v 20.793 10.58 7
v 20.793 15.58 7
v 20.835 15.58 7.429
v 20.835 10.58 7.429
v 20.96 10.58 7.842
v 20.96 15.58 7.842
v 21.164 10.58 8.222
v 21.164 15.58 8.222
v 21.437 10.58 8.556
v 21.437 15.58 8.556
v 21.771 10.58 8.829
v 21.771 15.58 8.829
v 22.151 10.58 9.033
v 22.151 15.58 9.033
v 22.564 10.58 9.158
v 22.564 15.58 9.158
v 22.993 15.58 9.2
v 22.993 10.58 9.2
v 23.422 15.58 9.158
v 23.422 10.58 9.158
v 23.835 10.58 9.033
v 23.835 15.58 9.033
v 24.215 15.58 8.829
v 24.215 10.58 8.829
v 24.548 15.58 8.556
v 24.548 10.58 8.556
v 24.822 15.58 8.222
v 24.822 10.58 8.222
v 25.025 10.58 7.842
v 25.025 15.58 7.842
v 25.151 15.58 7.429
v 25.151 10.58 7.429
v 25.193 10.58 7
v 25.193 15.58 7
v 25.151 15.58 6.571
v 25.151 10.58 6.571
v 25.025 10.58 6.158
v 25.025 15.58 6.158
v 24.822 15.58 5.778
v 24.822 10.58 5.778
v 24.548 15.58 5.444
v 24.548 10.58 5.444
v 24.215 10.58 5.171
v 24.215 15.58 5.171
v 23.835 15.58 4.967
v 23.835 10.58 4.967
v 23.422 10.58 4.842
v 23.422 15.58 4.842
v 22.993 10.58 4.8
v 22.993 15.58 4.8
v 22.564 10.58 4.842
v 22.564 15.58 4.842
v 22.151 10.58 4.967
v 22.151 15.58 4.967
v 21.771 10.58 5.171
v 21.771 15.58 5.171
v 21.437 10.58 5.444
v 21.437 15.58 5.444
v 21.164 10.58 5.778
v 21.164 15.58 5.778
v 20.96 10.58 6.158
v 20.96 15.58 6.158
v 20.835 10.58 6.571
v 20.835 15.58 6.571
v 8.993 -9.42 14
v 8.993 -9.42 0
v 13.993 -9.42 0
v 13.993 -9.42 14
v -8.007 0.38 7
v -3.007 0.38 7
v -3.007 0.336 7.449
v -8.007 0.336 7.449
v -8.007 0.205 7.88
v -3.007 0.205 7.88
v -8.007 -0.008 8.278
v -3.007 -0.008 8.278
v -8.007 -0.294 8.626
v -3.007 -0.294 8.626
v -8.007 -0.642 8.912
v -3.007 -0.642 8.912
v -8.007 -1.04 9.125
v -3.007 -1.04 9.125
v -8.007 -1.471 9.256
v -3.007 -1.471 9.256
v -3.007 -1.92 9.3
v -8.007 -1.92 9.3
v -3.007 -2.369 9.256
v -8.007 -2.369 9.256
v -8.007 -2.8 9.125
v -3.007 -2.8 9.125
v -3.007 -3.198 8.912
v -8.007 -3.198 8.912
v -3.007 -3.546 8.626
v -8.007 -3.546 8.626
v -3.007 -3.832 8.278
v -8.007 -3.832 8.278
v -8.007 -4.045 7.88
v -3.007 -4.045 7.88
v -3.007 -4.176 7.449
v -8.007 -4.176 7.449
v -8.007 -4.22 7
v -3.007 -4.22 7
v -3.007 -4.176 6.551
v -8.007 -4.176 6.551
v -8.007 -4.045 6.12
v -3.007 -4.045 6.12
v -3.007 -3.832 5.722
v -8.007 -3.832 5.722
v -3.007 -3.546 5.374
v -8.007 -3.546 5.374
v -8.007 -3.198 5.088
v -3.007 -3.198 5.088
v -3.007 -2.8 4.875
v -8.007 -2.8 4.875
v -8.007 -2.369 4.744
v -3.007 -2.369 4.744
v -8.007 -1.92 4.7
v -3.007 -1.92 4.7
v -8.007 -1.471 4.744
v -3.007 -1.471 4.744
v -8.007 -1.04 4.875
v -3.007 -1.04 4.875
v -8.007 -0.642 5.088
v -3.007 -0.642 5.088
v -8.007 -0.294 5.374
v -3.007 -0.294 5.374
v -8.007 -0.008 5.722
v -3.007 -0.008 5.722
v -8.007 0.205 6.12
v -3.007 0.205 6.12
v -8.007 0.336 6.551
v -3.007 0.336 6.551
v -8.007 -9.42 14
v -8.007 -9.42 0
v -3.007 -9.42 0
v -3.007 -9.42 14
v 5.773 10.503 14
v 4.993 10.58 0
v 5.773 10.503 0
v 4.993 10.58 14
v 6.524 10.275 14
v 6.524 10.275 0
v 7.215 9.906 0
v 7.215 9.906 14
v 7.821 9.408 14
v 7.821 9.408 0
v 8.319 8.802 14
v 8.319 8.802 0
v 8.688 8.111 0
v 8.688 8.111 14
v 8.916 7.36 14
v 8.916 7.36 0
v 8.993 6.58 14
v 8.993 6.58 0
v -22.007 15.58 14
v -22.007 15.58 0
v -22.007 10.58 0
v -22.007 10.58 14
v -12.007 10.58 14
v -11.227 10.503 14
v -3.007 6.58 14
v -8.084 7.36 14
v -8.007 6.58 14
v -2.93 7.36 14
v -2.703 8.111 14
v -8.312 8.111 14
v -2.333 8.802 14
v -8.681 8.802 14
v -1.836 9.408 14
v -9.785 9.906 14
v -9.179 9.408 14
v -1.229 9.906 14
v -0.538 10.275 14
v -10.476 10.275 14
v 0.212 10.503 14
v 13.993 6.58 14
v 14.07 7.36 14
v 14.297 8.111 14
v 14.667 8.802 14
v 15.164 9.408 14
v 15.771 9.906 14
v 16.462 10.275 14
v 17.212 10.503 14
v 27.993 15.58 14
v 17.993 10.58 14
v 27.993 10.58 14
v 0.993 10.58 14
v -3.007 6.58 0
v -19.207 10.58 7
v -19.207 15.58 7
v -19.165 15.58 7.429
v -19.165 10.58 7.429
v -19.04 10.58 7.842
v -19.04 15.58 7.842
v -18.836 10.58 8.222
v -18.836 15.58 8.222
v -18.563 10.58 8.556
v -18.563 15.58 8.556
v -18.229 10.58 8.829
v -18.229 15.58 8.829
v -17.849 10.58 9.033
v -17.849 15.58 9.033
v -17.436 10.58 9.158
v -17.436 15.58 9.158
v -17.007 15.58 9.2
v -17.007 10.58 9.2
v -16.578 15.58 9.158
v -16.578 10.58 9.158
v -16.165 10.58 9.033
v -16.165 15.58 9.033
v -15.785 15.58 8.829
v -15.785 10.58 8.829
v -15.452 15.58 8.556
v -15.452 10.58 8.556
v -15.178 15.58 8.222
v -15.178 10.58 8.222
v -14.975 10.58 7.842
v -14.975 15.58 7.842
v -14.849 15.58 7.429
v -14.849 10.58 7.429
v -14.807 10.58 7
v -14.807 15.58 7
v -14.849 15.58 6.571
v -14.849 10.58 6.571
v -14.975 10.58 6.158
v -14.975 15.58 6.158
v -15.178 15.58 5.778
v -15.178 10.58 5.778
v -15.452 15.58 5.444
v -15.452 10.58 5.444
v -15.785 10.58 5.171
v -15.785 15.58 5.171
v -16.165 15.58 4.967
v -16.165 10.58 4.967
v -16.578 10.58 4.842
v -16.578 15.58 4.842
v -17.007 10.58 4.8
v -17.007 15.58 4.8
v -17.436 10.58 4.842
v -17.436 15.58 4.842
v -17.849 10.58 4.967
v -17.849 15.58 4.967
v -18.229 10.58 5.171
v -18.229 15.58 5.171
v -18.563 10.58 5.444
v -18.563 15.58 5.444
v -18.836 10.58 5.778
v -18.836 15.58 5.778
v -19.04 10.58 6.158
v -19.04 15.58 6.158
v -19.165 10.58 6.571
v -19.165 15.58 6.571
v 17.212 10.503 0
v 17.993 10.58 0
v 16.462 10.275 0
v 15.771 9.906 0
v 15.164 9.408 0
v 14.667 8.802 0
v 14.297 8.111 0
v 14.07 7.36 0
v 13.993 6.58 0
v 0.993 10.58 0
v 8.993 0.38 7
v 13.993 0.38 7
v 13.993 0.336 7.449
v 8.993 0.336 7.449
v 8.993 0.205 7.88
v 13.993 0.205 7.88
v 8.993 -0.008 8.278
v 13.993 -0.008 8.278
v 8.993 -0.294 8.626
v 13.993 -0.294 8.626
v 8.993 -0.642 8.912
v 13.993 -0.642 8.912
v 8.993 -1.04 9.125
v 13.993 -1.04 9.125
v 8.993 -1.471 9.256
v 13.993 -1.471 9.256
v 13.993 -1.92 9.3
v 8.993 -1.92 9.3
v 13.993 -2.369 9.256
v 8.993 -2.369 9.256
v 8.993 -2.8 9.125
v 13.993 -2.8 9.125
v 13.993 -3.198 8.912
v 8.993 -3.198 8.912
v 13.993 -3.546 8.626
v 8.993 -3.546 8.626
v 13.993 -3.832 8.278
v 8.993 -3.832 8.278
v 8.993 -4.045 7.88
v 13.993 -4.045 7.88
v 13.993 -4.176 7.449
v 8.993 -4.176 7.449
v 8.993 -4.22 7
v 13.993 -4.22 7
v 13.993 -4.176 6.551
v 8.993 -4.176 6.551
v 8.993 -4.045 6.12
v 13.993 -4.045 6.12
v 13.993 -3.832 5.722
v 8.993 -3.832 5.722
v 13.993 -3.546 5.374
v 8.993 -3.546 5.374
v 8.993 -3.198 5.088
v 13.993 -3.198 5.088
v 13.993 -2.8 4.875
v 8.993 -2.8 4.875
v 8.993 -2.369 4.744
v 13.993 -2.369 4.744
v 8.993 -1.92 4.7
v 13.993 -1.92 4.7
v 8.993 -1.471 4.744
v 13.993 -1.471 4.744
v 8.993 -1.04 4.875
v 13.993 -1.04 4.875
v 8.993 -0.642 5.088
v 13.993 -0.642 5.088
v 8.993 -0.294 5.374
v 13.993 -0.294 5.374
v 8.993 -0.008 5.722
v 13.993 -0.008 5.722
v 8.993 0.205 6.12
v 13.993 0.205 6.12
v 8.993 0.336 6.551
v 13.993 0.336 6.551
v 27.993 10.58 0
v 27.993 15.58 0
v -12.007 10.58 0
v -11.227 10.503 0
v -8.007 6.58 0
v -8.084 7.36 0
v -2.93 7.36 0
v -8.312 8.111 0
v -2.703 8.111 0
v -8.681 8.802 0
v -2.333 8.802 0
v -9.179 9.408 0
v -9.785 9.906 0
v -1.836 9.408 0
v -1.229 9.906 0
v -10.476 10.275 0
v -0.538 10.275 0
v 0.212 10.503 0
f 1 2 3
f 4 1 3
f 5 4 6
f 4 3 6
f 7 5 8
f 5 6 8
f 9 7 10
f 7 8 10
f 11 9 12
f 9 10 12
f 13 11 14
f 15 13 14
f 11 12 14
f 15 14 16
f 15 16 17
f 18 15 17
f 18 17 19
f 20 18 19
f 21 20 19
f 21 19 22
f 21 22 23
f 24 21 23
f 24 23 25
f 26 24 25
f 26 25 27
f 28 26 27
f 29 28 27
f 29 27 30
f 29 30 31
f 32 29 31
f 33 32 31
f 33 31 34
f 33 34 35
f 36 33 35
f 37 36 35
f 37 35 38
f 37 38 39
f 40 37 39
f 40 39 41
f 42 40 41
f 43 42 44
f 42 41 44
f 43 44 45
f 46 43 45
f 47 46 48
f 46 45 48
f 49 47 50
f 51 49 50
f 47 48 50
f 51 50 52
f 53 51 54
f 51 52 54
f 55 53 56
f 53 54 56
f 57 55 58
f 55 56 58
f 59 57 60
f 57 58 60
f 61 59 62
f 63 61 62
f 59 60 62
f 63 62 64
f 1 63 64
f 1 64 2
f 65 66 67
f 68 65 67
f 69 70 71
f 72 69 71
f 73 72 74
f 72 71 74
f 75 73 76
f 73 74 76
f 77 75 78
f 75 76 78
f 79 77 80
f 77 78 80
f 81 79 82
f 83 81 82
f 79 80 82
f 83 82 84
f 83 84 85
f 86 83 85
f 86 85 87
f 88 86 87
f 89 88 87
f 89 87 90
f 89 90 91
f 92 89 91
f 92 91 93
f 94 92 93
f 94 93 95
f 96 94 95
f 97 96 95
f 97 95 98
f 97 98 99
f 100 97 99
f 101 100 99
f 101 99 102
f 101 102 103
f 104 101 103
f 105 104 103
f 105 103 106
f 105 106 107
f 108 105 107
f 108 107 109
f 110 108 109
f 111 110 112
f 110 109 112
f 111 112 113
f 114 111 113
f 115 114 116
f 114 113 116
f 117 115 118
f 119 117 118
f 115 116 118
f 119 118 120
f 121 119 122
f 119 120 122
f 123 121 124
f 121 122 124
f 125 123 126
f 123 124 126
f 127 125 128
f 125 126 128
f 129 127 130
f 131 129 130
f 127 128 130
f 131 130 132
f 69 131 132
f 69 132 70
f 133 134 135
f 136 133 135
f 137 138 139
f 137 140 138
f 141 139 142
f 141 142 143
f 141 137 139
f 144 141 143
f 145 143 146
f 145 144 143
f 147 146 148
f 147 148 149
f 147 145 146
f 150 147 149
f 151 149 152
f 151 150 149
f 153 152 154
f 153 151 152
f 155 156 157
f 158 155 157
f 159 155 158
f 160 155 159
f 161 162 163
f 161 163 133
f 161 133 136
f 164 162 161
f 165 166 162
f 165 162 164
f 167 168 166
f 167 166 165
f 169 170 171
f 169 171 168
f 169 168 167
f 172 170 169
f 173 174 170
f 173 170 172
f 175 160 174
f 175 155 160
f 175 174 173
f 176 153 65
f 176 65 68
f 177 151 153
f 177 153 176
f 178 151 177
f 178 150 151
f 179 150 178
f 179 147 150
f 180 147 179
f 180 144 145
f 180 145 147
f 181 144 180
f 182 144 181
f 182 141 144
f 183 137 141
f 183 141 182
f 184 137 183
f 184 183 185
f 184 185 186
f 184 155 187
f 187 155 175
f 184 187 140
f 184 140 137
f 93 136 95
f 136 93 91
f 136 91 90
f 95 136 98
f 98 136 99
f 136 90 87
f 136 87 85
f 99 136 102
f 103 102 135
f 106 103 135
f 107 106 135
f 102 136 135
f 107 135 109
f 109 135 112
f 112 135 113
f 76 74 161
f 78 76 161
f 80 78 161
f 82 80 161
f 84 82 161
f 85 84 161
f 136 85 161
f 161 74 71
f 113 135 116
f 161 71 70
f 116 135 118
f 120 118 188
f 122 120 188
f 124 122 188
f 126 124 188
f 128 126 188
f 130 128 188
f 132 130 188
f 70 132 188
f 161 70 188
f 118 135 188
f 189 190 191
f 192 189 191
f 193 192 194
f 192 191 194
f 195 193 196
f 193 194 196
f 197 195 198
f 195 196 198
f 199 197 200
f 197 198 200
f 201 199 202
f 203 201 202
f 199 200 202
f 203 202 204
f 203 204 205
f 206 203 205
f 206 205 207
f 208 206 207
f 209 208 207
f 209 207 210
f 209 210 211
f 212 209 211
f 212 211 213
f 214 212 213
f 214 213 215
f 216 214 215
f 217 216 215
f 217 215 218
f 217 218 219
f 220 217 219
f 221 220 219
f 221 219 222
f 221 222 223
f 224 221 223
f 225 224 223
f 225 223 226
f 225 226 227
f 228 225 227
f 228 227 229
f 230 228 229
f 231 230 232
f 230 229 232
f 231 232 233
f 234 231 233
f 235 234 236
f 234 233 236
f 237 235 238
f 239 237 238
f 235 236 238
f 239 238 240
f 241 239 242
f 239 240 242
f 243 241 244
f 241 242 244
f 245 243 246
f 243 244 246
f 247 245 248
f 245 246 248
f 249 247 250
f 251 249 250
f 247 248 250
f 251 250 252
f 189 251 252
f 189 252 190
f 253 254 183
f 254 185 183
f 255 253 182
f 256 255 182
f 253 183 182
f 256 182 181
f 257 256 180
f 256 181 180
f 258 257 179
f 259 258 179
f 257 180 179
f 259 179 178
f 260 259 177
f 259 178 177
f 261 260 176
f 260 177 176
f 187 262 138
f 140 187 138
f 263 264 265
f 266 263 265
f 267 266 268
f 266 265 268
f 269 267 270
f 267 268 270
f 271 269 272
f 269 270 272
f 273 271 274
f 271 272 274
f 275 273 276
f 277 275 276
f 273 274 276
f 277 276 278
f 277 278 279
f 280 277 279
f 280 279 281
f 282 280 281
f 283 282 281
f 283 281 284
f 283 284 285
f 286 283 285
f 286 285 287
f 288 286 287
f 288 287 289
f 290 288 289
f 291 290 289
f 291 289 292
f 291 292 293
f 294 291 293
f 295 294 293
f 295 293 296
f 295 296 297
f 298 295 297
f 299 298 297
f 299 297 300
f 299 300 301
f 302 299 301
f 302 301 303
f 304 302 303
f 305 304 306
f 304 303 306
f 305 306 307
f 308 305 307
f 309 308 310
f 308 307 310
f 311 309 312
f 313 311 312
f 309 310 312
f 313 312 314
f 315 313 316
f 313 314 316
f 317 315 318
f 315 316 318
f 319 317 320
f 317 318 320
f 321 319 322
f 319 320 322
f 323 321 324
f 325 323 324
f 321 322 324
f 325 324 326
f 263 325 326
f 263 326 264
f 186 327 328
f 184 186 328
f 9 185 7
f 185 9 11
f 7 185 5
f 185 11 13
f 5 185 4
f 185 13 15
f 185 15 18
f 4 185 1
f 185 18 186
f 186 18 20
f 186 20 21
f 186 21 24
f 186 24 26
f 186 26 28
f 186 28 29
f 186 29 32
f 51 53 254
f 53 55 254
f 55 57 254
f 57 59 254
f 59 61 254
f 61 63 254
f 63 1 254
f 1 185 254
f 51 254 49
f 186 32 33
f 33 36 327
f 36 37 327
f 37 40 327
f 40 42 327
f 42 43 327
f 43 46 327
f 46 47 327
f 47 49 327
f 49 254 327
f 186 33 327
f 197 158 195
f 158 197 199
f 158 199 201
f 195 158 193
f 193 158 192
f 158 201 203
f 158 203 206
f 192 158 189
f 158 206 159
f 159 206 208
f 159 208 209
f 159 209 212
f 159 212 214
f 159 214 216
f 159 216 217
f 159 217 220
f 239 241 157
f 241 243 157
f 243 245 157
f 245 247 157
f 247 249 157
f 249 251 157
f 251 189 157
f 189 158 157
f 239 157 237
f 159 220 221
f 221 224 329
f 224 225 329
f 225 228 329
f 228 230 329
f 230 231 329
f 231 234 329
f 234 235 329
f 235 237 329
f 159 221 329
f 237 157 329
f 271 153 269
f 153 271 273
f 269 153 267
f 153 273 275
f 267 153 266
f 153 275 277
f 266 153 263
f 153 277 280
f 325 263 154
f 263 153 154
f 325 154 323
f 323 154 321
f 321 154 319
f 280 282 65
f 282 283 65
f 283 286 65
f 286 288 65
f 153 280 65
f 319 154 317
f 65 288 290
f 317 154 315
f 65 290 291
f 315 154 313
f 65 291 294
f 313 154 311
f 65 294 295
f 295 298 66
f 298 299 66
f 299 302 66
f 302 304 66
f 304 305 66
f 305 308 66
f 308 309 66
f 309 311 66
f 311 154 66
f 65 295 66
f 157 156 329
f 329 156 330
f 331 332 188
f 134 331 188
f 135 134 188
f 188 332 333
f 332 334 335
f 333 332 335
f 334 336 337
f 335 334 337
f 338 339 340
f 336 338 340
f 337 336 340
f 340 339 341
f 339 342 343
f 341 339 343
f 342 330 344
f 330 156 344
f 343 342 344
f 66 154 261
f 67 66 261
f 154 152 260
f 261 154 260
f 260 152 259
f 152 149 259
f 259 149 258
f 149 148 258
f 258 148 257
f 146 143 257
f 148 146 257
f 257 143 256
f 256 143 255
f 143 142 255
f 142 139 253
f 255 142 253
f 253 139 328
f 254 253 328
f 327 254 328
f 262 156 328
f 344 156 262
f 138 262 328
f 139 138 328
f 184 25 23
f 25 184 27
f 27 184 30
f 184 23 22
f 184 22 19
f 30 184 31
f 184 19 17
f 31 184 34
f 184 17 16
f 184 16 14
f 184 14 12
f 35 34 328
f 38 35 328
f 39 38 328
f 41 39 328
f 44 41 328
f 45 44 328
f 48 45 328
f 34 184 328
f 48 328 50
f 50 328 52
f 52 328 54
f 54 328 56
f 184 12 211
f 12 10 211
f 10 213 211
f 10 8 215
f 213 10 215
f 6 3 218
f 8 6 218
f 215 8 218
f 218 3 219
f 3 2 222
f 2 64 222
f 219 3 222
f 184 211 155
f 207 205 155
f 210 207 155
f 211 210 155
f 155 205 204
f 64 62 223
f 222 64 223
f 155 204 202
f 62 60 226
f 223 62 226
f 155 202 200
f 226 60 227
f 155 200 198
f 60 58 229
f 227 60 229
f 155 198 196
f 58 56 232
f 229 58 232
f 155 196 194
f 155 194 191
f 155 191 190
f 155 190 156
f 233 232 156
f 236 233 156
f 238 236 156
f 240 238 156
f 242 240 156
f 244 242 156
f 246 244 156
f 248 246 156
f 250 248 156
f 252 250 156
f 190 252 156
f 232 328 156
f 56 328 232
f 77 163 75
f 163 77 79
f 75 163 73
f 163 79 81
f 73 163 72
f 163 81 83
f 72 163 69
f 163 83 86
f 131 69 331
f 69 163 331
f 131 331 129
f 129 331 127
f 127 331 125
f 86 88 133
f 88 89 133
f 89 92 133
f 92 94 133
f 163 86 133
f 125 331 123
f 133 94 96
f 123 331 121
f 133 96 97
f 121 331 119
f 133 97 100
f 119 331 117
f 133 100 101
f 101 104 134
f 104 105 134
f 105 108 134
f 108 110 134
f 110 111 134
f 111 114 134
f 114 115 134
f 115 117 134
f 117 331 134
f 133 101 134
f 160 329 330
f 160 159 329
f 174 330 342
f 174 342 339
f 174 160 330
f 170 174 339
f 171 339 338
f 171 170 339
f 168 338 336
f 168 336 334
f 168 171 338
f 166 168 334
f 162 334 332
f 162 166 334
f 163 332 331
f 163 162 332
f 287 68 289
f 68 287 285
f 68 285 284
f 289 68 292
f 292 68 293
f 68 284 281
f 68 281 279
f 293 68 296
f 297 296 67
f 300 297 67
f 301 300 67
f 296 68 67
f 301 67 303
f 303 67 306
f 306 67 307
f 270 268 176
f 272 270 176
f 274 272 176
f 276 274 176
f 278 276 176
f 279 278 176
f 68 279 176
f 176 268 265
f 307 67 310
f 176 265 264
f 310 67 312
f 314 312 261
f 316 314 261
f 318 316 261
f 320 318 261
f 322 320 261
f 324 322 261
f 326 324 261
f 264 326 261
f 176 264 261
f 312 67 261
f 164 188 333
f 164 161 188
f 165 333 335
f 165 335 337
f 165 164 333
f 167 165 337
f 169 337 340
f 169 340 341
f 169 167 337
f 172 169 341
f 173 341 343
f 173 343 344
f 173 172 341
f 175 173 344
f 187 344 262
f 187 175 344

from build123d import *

# Parameters (mm, degrees)
PAD_DEPTH       = 14
SKETCH001_R     = 2.3
POCKET_DEPTH    = 36.001
SKETCH002_R     = 2.2
POCKET001_DEPTH = 25.001
FILLET_R        = 4


with BuildPart() as part:
    # Sketch → Pad (new body)
    with BuildSketch(Plane.XY):
        Polygon((27.992845, 15.579944), (-22.007155, 15.579944), (-22.007155, 10.579944), (-8.007155, 10.579944), (-8.007155, -9.420056), (-3.007155, -9.420056), (-3.007155, 10.579944), (8.992845, 10.579944), (8.992845, -9.420056), (13.992845, -9.420056), (13.992845, 10.579944), (27.992845, 10.579944), align=None)
    extrude(amount=PAD_DEPTH)

    # Sketch001 → Pocket (cut, through all)
    with BuildSketch(Plane.YZ.offset(13.992845)):
        with Locations((-1.920056, 7)):
            Circle(SKETCH001_R)
    extrude(amount=-POCKET_DEPTH, mode=Mode.SUBTRACT)

    # Sketch002 → Pocket001 (cut, through all)
    with BuildSketch(Plane(origin=(0, 15.579944, 0), x_dir=(-1, 0, 0), z_dir=(0, 1, 0))):
        with Locations((-22.992845, 7)):
            Circle(SKETCH002_R)
        with Locations((17.007155, 7)):
            Circle(SKETCH002_R)
    extrude(amount=-POCKET001_DEPTH, mode=Mode.SUBTRACT)

    # Fillet
    fillet_edges = [part.edges().sort_by_distance(p)[0] for p in [
        (13.992845, 10.579944, 7),
        (-8.007155, 10.579944, 7),
        (8.992845, 10.579944, 7),
        (-3.007155, 10.579944, 7),
    ]]
    fillet(fillet_edges, radius=FILLET_R)


solid = part.part
